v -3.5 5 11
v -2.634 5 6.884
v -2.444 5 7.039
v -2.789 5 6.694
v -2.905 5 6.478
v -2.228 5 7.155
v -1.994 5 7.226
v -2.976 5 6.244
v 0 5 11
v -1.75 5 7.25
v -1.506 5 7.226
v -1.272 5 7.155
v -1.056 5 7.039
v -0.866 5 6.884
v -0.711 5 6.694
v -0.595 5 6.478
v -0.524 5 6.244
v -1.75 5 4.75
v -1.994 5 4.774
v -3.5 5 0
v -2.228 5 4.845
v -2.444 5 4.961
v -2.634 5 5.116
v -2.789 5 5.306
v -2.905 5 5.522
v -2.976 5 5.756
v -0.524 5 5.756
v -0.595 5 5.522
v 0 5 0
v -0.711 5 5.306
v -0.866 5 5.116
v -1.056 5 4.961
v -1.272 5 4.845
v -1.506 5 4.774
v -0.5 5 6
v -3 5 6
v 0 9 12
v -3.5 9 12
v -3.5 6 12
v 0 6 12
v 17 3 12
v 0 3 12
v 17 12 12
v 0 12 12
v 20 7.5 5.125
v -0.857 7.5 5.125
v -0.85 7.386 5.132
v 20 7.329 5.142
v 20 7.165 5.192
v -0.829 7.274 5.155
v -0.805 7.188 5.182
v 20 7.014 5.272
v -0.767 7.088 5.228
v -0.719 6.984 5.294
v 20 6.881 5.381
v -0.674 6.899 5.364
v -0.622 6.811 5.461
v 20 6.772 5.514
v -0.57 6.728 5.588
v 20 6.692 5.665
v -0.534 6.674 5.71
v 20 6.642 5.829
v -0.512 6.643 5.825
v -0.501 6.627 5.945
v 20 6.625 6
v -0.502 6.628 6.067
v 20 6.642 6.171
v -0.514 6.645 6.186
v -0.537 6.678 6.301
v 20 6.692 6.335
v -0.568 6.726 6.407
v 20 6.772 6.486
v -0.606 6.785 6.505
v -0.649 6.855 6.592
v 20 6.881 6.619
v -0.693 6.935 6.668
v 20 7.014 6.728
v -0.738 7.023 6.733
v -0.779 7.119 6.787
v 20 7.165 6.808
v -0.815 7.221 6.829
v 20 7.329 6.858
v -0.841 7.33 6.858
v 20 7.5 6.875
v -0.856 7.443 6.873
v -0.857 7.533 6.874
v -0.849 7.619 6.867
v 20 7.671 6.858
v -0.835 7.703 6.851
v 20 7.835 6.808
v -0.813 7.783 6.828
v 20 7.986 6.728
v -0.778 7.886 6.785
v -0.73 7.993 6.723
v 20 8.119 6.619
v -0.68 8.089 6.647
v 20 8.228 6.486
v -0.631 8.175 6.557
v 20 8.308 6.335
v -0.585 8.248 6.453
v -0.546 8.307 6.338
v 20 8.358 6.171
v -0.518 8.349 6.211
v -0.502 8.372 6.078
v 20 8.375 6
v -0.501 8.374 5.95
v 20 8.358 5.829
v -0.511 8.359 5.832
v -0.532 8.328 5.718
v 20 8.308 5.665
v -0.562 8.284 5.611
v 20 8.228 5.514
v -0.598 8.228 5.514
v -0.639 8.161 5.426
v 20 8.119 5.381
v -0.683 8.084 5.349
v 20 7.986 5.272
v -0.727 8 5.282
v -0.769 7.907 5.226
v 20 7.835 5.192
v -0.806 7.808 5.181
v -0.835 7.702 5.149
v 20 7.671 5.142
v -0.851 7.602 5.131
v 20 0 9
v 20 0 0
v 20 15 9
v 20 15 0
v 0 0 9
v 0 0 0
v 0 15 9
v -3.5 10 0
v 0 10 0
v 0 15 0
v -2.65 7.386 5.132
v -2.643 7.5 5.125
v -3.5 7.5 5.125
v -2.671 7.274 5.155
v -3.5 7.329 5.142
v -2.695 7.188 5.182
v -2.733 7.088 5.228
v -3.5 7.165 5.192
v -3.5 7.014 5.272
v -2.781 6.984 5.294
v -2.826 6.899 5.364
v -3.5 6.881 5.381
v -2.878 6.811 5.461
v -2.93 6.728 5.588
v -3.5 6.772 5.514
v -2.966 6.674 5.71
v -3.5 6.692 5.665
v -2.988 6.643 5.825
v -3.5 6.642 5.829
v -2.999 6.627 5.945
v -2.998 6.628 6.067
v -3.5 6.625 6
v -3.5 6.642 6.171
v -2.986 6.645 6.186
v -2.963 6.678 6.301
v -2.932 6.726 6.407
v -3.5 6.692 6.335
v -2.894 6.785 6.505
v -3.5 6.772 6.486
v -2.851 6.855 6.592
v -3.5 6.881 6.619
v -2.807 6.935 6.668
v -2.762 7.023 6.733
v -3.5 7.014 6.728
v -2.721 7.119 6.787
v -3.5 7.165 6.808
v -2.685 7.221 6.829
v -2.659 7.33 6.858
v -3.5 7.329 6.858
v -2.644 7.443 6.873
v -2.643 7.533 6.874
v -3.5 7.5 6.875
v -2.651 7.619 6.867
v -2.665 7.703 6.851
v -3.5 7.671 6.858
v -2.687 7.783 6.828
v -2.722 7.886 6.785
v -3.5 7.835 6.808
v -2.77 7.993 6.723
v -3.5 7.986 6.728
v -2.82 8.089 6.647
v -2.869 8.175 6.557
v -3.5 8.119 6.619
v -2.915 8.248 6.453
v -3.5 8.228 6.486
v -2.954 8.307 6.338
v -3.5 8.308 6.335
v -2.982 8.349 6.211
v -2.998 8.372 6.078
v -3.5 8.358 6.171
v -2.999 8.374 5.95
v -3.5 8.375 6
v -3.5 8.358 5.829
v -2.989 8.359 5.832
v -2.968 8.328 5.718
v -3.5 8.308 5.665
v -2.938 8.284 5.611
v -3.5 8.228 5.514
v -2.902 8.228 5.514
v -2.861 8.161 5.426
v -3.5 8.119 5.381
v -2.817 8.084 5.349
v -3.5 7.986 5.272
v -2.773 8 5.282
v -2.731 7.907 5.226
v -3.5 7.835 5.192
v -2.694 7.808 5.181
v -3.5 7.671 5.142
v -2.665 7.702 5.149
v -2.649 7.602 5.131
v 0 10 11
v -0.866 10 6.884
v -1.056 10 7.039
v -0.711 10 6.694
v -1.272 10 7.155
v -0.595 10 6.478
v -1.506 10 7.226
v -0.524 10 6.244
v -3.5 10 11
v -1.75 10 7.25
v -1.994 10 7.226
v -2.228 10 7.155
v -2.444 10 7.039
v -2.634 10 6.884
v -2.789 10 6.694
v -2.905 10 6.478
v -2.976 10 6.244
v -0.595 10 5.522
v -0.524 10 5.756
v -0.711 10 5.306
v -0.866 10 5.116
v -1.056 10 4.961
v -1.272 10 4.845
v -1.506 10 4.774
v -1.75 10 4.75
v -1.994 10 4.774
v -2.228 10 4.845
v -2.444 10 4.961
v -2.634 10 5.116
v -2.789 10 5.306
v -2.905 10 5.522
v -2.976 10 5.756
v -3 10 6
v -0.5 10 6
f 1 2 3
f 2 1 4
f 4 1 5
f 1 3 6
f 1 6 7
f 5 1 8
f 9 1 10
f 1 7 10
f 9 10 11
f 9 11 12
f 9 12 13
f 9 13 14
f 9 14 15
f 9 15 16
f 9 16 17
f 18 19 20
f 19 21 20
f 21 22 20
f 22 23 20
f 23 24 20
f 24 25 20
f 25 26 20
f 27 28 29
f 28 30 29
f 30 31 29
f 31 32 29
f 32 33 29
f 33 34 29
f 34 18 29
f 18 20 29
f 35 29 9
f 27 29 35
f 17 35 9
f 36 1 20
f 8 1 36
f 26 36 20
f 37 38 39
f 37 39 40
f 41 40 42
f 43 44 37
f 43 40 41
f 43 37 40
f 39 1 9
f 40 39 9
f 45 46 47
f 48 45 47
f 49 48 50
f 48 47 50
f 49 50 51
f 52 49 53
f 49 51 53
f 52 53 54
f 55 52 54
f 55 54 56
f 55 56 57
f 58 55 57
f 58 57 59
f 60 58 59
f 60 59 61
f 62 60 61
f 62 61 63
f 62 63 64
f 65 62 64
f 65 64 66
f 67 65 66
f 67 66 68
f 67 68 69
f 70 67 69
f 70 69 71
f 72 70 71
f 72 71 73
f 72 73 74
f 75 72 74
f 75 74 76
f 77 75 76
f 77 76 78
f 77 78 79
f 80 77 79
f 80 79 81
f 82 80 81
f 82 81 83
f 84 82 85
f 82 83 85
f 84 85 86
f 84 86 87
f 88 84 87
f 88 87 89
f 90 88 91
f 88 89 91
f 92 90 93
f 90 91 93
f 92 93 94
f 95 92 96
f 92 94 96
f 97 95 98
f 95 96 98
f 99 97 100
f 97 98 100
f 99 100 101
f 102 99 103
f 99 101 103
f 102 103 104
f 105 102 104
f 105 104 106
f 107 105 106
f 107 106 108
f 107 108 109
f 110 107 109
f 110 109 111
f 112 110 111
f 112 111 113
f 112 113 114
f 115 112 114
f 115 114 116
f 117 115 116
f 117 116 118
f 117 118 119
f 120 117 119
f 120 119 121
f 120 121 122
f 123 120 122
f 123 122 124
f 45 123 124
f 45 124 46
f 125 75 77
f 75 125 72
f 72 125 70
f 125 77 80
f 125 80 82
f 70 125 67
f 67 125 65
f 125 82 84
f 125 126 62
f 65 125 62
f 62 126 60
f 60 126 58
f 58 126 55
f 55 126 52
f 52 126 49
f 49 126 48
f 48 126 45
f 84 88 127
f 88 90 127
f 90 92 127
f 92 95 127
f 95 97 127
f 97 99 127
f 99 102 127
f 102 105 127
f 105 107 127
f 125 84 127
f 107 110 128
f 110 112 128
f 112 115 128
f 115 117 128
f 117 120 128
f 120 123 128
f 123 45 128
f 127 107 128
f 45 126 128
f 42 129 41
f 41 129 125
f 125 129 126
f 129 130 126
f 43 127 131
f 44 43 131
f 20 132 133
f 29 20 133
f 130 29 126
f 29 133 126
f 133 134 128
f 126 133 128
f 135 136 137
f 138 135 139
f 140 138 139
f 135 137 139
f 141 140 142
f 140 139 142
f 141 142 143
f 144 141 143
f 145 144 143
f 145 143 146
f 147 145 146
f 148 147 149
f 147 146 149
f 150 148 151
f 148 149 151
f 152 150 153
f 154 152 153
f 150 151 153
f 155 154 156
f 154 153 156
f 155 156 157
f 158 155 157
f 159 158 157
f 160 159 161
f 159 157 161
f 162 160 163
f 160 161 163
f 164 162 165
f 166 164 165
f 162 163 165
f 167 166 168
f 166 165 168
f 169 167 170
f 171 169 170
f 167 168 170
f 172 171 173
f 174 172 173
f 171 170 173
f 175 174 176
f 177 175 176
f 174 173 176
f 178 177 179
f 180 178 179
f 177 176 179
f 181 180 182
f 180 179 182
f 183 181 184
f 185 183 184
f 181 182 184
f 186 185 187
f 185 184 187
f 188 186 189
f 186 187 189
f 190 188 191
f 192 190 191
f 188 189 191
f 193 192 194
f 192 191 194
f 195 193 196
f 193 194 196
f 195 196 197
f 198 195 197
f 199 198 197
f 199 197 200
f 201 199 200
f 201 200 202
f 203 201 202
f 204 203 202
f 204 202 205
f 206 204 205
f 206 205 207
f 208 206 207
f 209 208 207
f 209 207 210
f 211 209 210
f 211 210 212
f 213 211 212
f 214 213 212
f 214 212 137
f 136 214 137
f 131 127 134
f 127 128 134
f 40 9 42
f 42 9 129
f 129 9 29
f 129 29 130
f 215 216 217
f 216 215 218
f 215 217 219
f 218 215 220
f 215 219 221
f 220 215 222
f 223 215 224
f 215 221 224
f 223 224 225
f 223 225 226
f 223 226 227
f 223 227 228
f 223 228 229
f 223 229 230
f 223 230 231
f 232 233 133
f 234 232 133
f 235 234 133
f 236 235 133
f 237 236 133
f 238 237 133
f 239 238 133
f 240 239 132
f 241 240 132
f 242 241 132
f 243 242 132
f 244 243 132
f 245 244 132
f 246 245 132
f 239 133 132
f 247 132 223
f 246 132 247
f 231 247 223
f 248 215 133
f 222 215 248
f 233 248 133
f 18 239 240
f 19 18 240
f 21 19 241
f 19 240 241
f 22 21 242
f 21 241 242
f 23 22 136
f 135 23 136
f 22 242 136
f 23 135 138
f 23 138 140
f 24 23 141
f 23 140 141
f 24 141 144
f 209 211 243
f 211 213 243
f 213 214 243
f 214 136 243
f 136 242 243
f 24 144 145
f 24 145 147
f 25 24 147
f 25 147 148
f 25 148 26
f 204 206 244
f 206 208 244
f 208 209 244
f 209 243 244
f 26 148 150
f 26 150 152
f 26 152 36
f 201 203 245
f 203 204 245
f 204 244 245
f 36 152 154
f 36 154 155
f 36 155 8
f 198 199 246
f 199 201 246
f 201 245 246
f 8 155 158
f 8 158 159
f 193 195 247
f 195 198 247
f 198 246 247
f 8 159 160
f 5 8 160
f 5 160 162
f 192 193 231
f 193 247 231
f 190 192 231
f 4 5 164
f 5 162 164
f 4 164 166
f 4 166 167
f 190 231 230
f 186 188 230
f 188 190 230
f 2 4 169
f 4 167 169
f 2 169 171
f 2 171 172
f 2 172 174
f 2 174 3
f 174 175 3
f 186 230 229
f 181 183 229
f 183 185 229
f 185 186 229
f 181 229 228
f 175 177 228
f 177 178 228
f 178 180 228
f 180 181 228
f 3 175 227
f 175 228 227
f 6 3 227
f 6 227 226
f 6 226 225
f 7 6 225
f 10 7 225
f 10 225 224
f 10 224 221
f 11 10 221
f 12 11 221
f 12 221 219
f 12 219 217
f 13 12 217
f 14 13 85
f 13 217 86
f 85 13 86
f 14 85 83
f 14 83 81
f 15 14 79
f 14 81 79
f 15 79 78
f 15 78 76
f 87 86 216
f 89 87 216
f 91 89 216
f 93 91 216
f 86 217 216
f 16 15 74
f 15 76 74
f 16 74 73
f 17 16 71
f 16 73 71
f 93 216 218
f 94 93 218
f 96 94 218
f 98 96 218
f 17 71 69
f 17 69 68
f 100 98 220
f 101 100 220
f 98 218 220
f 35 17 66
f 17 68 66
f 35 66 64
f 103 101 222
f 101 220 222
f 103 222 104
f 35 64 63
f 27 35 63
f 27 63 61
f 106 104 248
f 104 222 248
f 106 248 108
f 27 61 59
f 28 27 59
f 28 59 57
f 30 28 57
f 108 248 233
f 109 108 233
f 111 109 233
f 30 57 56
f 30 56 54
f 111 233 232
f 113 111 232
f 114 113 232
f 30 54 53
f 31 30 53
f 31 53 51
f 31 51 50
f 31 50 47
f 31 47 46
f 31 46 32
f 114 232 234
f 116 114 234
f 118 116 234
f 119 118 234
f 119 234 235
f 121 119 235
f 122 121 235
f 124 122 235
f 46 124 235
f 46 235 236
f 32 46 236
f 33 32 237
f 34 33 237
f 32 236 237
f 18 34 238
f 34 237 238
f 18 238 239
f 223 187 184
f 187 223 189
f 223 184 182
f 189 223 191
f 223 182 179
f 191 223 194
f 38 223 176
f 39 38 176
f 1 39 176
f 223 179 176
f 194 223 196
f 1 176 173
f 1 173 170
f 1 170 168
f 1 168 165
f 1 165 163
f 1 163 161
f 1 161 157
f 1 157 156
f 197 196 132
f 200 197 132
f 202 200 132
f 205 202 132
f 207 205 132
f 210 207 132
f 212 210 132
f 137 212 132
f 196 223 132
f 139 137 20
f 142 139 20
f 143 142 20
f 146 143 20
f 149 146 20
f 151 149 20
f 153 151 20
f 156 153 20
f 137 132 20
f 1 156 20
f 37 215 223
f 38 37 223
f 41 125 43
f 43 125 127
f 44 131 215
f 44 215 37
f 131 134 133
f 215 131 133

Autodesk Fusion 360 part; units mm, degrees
sketch "Sketch1" plane through (0, 0, 0) normal (0, 0, 1) x (1, 0, 0)
  line L0 (0, 0) -> (20, 0)
  line L1 (20, 0) -> (20, 15)
  line L2 (20, 15) -> (0, 15)
  line L3 (0, 15) -> (0, 0)
  dimension "d1" = 15
sketch "Sketch2" plane through (0, 0, 0) normal (0, 0, 1) x (1, 0, 0)
  line L0 (0, 10) -> (-3.5, 10)
  line L1 (-3.5, 10) -> (-3.5, 5)
  line L2 (-3.5, 5) -> (0, 5)
  line L3 (0, 5) -> (0, 10)
  dimension "d2" = 3.5
extrude "Extrude1" add sketch "Sketch1" sketch "Sketch2" along normal blind 12 of sketch 2
chamfer "Chamfer1" distance 3 angle 45 1 edges at (10, 0, 12)
chamfer "Chamfer2" distance 3 angle 45 1 edges at (10, 15, 12)
hole "Hole1" at (-1.75, 5, 6) direction (0, 1, 0) diameter 2.5 depth 9 tip angle 118
hole "Hole2" at (20, 7.5, 6) direction (-1, 0, 0) diameter 1.75 depth 38 tip angle 118
chamfer "Chamfer3" distance 3 angle 45 1 edges at (20, 7.5, 12)
chamfer "Chamfer4" distance 1 angle 45 2 edges at (-1.75, 5, 12) (-1.75, 10, 12)
